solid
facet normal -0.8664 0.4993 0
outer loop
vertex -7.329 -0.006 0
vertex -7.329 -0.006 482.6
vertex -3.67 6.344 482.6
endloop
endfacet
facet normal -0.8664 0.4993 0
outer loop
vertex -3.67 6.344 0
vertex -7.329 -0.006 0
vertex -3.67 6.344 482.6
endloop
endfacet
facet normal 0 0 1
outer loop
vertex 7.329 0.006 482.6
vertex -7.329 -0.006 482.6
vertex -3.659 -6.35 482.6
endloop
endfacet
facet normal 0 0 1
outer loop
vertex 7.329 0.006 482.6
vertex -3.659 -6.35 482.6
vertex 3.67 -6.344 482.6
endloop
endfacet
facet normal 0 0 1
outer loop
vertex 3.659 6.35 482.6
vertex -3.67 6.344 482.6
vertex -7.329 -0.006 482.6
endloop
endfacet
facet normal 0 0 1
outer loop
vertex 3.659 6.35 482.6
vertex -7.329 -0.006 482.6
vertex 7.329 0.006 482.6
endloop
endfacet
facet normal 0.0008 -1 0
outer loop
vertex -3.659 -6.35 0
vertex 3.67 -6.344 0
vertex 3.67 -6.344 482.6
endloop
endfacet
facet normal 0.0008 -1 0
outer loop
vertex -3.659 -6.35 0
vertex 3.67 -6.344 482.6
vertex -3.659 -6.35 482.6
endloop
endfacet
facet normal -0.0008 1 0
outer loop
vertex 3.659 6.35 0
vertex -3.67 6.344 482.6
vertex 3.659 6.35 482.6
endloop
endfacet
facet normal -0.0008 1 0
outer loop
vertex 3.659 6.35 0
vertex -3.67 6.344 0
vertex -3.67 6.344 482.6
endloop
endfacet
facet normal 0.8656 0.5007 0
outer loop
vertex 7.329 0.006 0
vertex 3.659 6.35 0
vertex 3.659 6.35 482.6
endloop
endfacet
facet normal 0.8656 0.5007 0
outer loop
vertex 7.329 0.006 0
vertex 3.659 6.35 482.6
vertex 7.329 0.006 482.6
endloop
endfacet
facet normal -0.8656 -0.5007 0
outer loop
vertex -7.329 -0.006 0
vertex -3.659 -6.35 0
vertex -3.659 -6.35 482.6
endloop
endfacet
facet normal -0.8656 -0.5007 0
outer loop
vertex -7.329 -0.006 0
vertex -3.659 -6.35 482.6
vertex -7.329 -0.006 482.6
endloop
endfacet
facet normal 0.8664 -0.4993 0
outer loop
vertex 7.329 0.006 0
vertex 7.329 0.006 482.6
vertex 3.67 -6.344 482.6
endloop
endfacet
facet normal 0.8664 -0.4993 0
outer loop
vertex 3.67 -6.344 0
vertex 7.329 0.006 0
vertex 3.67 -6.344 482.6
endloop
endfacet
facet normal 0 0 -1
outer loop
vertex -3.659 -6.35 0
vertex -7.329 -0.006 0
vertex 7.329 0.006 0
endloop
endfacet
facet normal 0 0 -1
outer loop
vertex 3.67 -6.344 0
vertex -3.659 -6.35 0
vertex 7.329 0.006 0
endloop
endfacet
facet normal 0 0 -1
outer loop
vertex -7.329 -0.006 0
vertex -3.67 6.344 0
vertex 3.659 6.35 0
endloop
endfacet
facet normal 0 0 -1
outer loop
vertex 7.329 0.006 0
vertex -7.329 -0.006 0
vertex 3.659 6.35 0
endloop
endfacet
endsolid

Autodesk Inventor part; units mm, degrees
ref_plane "YZ Plane" through (0, 0, 0) normal (1, 0, 0) x (0, 1, 0)
ref_plane "XZ Plane" through (0, 0, 0) normal (0, 1, 0) x (-1, 0, 0)
ref_plane "XY Plane" through (0, 0, 0) normal (0, 0, 1) x (1, 0, 0)
sketch "Sketch1" plane through (0, 0, 0) normal (0, 0, 1) x (1, 0, 0)
  line L0 (0, 0) -> (0, 6.35) construction
  line L1 (3.6591, 6.35) -> (7.3288, 0.0061)
  line L2 (7.3288, 0.0061) -> (3.6697, -6.3439)
  line L3 (3.6697, -6.3439) -> (-3.6591, -6.35)
  line L4 (-3.6591, -6.35) -> (-7.3288, -0.0061)
  line L5 (-7.3288, -0.0061) -> (-3.6697, 6.3439)
  line L6 (-3.6697, 6.3439) -> (3.6591, 6.35)
  dimension "d0" = 6.35
extrude "Extrusion1" add sketch "Sketch1" along normal blind 482.6
properties part number "Hex Shaft ARm"
